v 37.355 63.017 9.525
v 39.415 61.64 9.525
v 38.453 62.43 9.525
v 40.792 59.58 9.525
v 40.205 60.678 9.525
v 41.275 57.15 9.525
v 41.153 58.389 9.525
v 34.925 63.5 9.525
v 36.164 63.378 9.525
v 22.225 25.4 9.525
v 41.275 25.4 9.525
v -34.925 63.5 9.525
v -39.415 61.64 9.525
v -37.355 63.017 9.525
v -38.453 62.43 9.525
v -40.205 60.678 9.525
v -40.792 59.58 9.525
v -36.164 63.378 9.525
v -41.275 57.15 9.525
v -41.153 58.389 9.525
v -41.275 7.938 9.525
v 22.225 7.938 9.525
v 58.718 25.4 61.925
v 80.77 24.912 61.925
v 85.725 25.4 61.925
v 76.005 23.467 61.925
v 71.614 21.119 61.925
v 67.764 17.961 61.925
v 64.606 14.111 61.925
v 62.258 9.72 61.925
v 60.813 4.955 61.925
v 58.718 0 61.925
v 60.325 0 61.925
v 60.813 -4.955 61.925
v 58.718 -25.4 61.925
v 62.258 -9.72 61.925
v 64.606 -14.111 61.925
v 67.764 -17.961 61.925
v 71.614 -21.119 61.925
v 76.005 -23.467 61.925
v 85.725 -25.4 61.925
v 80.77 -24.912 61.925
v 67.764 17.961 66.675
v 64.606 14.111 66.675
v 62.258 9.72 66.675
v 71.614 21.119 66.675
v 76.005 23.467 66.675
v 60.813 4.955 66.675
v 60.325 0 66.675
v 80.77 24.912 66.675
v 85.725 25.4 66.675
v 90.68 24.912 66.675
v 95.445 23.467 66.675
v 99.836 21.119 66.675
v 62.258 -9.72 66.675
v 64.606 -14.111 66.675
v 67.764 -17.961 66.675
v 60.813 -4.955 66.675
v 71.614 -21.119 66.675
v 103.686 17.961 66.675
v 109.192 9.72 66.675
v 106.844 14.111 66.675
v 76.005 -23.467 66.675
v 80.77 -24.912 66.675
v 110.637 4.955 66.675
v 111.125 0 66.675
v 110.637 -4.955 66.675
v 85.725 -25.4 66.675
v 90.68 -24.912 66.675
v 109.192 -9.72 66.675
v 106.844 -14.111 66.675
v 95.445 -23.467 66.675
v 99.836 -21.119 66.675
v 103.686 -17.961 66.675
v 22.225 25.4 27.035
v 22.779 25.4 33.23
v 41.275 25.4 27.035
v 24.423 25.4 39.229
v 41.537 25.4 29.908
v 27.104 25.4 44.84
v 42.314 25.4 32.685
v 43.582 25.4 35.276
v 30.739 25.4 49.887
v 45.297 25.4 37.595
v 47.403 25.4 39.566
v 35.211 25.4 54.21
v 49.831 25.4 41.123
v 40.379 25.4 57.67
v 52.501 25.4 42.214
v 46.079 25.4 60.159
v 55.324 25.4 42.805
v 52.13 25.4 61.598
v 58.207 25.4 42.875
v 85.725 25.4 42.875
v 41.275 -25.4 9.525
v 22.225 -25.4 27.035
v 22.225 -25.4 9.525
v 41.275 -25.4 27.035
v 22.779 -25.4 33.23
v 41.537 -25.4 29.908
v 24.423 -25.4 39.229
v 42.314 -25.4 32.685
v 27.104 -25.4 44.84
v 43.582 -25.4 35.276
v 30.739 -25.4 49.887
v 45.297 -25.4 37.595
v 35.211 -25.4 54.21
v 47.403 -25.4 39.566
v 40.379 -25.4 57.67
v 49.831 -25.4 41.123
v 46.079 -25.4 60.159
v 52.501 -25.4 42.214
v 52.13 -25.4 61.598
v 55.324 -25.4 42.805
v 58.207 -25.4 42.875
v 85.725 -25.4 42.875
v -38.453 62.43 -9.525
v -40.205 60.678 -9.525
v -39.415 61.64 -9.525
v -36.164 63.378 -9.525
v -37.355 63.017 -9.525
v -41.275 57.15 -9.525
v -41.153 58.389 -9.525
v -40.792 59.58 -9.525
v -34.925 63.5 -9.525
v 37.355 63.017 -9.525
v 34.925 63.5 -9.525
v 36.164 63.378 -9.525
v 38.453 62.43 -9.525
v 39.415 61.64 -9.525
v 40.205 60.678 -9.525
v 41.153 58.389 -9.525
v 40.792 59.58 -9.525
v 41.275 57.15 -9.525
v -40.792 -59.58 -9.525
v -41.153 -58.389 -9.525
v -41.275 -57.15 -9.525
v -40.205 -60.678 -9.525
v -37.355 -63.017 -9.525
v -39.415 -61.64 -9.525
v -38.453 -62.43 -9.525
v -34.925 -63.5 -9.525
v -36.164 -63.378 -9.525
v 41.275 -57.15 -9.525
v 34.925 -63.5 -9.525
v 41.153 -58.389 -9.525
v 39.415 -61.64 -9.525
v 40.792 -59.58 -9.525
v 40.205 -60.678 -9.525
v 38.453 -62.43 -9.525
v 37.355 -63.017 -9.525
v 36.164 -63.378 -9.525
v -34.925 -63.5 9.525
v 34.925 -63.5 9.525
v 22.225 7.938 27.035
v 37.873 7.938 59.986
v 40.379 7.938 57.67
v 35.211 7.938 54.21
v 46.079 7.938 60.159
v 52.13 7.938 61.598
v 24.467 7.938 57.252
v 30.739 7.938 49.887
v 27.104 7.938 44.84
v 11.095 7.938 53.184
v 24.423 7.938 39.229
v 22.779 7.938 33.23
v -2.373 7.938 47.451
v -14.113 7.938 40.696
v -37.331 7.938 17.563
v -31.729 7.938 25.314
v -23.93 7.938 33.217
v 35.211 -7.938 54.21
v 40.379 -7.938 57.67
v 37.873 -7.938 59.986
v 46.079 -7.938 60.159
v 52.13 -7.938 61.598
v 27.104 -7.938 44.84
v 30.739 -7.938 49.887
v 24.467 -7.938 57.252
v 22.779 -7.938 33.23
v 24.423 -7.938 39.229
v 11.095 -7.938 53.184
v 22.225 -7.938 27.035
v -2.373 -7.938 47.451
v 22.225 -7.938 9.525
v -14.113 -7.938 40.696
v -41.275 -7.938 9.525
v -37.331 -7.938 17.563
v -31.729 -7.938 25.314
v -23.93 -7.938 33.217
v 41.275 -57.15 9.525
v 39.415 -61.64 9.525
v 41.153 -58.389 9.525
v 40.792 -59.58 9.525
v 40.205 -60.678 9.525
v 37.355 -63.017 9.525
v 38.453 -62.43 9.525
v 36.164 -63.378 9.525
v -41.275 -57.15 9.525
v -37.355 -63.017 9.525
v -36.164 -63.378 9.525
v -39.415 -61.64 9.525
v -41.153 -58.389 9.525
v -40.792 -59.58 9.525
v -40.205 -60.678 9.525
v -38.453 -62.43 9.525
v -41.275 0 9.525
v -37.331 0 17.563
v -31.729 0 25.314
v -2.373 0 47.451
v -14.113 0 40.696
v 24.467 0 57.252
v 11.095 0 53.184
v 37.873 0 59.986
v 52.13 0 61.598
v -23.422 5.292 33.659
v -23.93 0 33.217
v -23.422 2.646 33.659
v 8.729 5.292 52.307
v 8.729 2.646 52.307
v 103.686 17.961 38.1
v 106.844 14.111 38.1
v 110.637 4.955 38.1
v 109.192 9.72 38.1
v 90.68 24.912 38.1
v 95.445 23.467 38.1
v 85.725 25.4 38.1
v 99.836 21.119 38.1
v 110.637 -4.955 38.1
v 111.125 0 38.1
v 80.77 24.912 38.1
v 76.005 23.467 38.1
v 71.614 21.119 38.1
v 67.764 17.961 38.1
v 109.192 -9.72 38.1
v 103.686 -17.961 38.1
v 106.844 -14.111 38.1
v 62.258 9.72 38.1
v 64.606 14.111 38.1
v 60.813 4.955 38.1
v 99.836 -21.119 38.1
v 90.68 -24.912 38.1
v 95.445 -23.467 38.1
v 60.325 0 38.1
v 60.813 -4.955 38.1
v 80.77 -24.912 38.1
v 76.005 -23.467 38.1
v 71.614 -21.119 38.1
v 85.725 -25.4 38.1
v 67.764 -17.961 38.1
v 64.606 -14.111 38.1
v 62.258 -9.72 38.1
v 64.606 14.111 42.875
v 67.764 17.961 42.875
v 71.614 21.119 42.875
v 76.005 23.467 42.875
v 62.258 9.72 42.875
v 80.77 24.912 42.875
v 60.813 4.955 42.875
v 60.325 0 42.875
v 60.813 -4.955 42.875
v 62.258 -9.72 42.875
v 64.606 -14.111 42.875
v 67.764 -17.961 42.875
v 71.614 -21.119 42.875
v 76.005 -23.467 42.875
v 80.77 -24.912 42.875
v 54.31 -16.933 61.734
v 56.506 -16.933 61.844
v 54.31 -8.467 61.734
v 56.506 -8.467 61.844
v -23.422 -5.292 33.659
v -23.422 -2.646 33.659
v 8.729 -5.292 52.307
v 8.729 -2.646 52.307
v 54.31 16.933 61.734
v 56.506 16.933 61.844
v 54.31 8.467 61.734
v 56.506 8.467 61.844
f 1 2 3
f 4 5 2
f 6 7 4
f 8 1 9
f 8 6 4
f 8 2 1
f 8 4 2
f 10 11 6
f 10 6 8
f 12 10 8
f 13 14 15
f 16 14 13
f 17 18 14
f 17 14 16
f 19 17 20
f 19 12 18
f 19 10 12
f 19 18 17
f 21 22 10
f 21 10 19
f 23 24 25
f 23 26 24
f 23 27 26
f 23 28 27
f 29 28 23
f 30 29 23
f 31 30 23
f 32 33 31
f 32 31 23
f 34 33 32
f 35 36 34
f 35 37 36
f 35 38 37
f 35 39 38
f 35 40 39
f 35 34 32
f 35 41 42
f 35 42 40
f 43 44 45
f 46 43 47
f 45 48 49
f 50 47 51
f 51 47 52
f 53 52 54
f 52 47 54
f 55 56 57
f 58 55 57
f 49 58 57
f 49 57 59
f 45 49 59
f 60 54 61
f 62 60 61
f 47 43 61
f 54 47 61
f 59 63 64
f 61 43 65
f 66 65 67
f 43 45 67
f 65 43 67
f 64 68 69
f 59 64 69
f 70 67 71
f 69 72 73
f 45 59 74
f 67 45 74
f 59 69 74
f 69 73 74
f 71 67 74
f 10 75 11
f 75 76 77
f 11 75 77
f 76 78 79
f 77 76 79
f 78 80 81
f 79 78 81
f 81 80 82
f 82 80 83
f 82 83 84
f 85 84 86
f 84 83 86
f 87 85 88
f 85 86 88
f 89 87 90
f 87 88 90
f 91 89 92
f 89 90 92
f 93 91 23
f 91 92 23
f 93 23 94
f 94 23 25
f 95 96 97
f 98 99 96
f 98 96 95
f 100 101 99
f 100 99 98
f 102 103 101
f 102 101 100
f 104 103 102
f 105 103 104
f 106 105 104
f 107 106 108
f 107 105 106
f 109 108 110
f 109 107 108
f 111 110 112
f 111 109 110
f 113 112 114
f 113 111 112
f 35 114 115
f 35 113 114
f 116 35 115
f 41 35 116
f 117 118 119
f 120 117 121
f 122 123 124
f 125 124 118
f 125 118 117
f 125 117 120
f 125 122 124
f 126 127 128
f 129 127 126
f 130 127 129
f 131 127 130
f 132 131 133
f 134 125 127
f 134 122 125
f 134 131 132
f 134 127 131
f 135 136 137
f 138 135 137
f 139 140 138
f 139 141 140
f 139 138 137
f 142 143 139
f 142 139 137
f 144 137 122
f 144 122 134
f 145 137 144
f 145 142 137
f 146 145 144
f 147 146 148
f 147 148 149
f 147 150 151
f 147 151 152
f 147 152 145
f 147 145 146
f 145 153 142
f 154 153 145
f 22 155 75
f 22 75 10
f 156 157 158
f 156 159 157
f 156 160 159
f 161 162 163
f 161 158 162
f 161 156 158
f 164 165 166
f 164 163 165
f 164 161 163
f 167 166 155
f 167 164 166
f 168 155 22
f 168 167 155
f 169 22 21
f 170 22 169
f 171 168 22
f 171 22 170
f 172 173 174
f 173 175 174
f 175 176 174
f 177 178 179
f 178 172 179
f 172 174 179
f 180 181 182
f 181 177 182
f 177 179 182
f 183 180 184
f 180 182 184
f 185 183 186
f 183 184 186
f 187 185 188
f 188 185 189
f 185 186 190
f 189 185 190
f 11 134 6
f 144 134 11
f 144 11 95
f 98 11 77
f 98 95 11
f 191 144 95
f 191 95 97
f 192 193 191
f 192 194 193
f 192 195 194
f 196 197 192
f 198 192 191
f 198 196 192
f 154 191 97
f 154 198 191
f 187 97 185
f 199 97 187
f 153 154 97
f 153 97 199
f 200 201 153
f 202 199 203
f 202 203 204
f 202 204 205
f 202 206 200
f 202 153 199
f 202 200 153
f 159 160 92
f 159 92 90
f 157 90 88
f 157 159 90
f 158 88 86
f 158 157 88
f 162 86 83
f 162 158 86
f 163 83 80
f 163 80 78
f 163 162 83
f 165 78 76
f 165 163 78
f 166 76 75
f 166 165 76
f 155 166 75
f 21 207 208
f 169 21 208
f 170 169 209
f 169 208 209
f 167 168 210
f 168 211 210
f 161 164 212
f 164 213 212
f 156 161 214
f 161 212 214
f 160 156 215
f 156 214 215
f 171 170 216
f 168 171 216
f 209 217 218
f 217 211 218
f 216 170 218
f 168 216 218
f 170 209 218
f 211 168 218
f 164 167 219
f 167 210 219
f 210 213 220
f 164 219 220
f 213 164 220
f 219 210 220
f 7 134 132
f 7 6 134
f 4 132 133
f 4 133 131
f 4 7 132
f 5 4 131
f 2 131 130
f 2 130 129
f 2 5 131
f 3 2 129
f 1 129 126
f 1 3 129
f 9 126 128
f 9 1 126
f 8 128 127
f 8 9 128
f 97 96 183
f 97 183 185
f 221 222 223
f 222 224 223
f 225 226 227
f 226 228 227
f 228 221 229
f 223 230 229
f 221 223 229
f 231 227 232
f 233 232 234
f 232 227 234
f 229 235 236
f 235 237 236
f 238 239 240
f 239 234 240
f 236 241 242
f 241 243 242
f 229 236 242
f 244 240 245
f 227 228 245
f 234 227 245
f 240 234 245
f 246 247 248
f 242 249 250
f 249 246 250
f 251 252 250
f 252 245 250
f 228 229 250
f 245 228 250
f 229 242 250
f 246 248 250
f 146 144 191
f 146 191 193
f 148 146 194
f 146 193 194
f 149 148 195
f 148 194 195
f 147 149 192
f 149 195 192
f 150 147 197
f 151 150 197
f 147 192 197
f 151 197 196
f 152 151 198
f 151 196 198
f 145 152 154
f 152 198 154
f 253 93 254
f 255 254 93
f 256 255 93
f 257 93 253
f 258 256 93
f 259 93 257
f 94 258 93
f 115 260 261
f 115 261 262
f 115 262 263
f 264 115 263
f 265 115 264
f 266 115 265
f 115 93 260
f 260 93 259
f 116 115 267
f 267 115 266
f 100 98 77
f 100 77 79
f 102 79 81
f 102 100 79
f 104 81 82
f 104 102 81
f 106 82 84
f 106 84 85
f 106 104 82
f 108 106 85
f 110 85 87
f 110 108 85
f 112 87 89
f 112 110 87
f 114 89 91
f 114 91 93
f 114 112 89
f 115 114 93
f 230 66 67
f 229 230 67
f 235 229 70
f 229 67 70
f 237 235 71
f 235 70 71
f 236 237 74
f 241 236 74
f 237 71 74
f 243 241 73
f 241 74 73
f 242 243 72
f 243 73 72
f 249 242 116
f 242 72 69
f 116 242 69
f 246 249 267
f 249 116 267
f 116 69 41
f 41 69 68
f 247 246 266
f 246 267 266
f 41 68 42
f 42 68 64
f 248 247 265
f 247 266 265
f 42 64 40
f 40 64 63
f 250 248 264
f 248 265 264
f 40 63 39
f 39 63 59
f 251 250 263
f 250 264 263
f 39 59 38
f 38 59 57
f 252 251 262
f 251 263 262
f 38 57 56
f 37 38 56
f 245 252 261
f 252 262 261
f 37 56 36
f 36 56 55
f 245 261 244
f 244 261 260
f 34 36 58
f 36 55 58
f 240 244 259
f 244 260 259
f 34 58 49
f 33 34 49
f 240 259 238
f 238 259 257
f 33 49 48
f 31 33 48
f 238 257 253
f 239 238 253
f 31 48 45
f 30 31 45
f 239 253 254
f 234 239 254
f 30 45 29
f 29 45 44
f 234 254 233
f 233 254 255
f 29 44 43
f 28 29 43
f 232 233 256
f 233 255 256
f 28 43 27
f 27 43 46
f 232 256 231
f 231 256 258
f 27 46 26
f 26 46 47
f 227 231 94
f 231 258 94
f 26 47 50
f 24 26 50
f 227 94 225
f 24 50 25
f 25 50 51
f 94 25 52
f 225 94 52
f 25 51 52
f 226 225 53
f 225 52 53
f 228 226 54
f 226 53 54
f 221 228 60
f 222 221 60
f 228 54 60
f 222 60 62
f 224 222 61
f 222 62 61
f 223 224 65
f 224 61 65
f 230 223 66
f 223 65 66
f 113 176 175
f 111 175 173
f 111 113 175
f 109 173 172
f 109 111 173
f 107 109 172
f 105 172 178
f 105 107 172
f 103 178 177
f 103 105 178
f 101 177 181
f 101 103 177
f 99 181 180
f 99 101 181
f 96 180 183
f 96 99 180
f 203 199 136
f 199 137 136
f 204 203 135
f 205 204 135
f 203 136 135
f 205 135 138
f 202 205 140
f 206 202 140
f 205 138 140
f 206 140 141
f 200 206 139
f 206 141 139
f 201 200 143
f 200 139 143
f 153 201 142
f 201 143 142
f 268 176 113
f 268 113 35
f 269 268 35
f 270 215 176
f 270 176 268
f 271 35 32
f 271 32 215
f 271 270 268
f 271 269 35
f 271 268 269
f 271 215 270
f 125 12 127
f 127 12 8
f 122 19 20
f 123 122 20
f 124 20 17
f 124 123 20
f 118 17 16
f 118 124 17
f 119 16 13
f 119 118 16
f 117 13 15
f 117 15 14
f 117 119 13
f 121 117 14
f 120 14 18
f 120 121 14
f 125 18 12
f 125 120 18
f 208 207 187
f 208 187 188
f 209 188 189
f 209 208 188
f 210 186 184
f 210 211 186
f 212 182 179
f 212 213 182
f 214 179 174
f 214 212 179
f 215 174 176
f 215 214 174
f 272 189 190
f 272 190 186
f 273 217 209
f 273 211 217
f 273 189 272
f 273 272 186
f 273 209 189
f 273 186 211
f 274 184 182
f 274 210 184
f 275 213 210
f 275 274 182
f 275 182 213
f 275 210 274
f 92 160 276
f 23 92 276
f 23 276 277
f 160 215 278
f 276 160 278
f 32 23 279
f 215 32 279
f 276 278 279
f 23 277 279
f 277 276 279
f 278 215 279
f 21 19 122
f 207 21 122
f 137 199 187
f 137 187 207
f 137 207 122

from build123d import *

# Parameters (mm, degrees)
F1_DEPTH = 63.5
F2_DEPTH = 25.4
F3_DEPTH = 7.9375
F5_R     = 6.35


with BuildPart() as f1:
    # F0 (on Front) → F1 (new body, symmetric)
    with BuildSketch(Plane.XZ):
        Polygon((-41.275, 9.525), (-41.275, -9.525), (41.275, -9.525), (41.275, 9.525), (22.225, 9.525), align=None)
    extrude(amount=F1_DEPTH, both=True)

    # F0 (on Front) → F2 (join, symmetric)
    with BuildSketch(Plane.XZ):
        with BuildLine():
            Line((22.225, 9.525), (41.275, 9.525))
            Line((41.275, 9.525), (41.275, 27.0354386152))
            ThreePointArc((41.275, 27.0354386152), (46.3048805337, 38.6284972609), (58.2071585843, 42.8752))
            Line((58.2071585843, 42.8752), (60.325, 42.8752))
            Line((60.325, 42.8752), (60.325, 61.9252))
            Line((60.325, 61.9252), (58.718494664, 61.9252))
            add(Edge.make_bspline(
                [(52.1296454234, 61.5977253585), (54.3011827008, 61.7480105937), (56.4978888968, 61.8577059663), (58.718494664, 61.9252)],
                knots=[108.0061657204, 108.0061657204, 108.0061657204, 108.0061657204, 112.8914520022, 112.8914520022, 112.8914520022, 112.8914520022], degree=3))
            ThreePointArc((52.1296454234, 61.5977253585), (30.7389084986, 49.8873503669), (22.225, 27.0354386152))
            Line((22.225, 27.0354386152), (22.225, 9.525))
        make_face()
        Polygon((85.725, 61.9252), (60.325, 61.9252), (60.325, 42.8752), (85.725, 42.8752), (85.725, 52.3875), align=None)
    extrude(amount=F2_DEPTH, both=True)

    # F0 (on Front) → F3 (join, symmetric)
    with BuildSketch(Plane.XZ):
        with BuildLine():
            add(Edge.make_bspline(
                [(-41.275, 9.525), (-31.5868860998, 35.1128955364), (4.1202962213, 58.2751499583), (52.1296454234, 61.5977253585)],
                knots=[0, 0, 0, 0, 108.0061657204, 108.0061657204, 108.0061657204, 108.0061657204], degree=3))
            Line((-41.275, 9.525), (22.225, 9.525))
            Line((22.225, 9.525), (22.225, 27.0354386152))
            ThreePointArc((22.225, 27.0354386152), (30.7389084986, 49.8873503669), (52.1296454234, 61.5977253585))
        make_face()
    extrude(amount=F3_DEPTH, both=True)

    # F0 (on Front) → F4 (revolve)
    with BuildSketch(Plane.XZ):
        Polygon((85.725, 66.675), (85.725, 61.9252), (85.725, 52.3875), (85.725, 42.8752), (85.725, 38.1), (111.125, 38.1), (111.125, 66.675), align=None)
    revolve(axis=Axis((85.725, 0, 52.3875), (0, 0, -1)))

    # F5
    f5_edges = [f1.edges().sort_by_distance(p)[0] for p in [
        (-41.275, -63.5, 0),
        (41.275, -63.5, 0),
        (41.275, 63.5, 0),
        (-41.275, 63.5, 0),
    ]]
    fillet(f5_edges, radius=F5_R)


solid = f1.part
